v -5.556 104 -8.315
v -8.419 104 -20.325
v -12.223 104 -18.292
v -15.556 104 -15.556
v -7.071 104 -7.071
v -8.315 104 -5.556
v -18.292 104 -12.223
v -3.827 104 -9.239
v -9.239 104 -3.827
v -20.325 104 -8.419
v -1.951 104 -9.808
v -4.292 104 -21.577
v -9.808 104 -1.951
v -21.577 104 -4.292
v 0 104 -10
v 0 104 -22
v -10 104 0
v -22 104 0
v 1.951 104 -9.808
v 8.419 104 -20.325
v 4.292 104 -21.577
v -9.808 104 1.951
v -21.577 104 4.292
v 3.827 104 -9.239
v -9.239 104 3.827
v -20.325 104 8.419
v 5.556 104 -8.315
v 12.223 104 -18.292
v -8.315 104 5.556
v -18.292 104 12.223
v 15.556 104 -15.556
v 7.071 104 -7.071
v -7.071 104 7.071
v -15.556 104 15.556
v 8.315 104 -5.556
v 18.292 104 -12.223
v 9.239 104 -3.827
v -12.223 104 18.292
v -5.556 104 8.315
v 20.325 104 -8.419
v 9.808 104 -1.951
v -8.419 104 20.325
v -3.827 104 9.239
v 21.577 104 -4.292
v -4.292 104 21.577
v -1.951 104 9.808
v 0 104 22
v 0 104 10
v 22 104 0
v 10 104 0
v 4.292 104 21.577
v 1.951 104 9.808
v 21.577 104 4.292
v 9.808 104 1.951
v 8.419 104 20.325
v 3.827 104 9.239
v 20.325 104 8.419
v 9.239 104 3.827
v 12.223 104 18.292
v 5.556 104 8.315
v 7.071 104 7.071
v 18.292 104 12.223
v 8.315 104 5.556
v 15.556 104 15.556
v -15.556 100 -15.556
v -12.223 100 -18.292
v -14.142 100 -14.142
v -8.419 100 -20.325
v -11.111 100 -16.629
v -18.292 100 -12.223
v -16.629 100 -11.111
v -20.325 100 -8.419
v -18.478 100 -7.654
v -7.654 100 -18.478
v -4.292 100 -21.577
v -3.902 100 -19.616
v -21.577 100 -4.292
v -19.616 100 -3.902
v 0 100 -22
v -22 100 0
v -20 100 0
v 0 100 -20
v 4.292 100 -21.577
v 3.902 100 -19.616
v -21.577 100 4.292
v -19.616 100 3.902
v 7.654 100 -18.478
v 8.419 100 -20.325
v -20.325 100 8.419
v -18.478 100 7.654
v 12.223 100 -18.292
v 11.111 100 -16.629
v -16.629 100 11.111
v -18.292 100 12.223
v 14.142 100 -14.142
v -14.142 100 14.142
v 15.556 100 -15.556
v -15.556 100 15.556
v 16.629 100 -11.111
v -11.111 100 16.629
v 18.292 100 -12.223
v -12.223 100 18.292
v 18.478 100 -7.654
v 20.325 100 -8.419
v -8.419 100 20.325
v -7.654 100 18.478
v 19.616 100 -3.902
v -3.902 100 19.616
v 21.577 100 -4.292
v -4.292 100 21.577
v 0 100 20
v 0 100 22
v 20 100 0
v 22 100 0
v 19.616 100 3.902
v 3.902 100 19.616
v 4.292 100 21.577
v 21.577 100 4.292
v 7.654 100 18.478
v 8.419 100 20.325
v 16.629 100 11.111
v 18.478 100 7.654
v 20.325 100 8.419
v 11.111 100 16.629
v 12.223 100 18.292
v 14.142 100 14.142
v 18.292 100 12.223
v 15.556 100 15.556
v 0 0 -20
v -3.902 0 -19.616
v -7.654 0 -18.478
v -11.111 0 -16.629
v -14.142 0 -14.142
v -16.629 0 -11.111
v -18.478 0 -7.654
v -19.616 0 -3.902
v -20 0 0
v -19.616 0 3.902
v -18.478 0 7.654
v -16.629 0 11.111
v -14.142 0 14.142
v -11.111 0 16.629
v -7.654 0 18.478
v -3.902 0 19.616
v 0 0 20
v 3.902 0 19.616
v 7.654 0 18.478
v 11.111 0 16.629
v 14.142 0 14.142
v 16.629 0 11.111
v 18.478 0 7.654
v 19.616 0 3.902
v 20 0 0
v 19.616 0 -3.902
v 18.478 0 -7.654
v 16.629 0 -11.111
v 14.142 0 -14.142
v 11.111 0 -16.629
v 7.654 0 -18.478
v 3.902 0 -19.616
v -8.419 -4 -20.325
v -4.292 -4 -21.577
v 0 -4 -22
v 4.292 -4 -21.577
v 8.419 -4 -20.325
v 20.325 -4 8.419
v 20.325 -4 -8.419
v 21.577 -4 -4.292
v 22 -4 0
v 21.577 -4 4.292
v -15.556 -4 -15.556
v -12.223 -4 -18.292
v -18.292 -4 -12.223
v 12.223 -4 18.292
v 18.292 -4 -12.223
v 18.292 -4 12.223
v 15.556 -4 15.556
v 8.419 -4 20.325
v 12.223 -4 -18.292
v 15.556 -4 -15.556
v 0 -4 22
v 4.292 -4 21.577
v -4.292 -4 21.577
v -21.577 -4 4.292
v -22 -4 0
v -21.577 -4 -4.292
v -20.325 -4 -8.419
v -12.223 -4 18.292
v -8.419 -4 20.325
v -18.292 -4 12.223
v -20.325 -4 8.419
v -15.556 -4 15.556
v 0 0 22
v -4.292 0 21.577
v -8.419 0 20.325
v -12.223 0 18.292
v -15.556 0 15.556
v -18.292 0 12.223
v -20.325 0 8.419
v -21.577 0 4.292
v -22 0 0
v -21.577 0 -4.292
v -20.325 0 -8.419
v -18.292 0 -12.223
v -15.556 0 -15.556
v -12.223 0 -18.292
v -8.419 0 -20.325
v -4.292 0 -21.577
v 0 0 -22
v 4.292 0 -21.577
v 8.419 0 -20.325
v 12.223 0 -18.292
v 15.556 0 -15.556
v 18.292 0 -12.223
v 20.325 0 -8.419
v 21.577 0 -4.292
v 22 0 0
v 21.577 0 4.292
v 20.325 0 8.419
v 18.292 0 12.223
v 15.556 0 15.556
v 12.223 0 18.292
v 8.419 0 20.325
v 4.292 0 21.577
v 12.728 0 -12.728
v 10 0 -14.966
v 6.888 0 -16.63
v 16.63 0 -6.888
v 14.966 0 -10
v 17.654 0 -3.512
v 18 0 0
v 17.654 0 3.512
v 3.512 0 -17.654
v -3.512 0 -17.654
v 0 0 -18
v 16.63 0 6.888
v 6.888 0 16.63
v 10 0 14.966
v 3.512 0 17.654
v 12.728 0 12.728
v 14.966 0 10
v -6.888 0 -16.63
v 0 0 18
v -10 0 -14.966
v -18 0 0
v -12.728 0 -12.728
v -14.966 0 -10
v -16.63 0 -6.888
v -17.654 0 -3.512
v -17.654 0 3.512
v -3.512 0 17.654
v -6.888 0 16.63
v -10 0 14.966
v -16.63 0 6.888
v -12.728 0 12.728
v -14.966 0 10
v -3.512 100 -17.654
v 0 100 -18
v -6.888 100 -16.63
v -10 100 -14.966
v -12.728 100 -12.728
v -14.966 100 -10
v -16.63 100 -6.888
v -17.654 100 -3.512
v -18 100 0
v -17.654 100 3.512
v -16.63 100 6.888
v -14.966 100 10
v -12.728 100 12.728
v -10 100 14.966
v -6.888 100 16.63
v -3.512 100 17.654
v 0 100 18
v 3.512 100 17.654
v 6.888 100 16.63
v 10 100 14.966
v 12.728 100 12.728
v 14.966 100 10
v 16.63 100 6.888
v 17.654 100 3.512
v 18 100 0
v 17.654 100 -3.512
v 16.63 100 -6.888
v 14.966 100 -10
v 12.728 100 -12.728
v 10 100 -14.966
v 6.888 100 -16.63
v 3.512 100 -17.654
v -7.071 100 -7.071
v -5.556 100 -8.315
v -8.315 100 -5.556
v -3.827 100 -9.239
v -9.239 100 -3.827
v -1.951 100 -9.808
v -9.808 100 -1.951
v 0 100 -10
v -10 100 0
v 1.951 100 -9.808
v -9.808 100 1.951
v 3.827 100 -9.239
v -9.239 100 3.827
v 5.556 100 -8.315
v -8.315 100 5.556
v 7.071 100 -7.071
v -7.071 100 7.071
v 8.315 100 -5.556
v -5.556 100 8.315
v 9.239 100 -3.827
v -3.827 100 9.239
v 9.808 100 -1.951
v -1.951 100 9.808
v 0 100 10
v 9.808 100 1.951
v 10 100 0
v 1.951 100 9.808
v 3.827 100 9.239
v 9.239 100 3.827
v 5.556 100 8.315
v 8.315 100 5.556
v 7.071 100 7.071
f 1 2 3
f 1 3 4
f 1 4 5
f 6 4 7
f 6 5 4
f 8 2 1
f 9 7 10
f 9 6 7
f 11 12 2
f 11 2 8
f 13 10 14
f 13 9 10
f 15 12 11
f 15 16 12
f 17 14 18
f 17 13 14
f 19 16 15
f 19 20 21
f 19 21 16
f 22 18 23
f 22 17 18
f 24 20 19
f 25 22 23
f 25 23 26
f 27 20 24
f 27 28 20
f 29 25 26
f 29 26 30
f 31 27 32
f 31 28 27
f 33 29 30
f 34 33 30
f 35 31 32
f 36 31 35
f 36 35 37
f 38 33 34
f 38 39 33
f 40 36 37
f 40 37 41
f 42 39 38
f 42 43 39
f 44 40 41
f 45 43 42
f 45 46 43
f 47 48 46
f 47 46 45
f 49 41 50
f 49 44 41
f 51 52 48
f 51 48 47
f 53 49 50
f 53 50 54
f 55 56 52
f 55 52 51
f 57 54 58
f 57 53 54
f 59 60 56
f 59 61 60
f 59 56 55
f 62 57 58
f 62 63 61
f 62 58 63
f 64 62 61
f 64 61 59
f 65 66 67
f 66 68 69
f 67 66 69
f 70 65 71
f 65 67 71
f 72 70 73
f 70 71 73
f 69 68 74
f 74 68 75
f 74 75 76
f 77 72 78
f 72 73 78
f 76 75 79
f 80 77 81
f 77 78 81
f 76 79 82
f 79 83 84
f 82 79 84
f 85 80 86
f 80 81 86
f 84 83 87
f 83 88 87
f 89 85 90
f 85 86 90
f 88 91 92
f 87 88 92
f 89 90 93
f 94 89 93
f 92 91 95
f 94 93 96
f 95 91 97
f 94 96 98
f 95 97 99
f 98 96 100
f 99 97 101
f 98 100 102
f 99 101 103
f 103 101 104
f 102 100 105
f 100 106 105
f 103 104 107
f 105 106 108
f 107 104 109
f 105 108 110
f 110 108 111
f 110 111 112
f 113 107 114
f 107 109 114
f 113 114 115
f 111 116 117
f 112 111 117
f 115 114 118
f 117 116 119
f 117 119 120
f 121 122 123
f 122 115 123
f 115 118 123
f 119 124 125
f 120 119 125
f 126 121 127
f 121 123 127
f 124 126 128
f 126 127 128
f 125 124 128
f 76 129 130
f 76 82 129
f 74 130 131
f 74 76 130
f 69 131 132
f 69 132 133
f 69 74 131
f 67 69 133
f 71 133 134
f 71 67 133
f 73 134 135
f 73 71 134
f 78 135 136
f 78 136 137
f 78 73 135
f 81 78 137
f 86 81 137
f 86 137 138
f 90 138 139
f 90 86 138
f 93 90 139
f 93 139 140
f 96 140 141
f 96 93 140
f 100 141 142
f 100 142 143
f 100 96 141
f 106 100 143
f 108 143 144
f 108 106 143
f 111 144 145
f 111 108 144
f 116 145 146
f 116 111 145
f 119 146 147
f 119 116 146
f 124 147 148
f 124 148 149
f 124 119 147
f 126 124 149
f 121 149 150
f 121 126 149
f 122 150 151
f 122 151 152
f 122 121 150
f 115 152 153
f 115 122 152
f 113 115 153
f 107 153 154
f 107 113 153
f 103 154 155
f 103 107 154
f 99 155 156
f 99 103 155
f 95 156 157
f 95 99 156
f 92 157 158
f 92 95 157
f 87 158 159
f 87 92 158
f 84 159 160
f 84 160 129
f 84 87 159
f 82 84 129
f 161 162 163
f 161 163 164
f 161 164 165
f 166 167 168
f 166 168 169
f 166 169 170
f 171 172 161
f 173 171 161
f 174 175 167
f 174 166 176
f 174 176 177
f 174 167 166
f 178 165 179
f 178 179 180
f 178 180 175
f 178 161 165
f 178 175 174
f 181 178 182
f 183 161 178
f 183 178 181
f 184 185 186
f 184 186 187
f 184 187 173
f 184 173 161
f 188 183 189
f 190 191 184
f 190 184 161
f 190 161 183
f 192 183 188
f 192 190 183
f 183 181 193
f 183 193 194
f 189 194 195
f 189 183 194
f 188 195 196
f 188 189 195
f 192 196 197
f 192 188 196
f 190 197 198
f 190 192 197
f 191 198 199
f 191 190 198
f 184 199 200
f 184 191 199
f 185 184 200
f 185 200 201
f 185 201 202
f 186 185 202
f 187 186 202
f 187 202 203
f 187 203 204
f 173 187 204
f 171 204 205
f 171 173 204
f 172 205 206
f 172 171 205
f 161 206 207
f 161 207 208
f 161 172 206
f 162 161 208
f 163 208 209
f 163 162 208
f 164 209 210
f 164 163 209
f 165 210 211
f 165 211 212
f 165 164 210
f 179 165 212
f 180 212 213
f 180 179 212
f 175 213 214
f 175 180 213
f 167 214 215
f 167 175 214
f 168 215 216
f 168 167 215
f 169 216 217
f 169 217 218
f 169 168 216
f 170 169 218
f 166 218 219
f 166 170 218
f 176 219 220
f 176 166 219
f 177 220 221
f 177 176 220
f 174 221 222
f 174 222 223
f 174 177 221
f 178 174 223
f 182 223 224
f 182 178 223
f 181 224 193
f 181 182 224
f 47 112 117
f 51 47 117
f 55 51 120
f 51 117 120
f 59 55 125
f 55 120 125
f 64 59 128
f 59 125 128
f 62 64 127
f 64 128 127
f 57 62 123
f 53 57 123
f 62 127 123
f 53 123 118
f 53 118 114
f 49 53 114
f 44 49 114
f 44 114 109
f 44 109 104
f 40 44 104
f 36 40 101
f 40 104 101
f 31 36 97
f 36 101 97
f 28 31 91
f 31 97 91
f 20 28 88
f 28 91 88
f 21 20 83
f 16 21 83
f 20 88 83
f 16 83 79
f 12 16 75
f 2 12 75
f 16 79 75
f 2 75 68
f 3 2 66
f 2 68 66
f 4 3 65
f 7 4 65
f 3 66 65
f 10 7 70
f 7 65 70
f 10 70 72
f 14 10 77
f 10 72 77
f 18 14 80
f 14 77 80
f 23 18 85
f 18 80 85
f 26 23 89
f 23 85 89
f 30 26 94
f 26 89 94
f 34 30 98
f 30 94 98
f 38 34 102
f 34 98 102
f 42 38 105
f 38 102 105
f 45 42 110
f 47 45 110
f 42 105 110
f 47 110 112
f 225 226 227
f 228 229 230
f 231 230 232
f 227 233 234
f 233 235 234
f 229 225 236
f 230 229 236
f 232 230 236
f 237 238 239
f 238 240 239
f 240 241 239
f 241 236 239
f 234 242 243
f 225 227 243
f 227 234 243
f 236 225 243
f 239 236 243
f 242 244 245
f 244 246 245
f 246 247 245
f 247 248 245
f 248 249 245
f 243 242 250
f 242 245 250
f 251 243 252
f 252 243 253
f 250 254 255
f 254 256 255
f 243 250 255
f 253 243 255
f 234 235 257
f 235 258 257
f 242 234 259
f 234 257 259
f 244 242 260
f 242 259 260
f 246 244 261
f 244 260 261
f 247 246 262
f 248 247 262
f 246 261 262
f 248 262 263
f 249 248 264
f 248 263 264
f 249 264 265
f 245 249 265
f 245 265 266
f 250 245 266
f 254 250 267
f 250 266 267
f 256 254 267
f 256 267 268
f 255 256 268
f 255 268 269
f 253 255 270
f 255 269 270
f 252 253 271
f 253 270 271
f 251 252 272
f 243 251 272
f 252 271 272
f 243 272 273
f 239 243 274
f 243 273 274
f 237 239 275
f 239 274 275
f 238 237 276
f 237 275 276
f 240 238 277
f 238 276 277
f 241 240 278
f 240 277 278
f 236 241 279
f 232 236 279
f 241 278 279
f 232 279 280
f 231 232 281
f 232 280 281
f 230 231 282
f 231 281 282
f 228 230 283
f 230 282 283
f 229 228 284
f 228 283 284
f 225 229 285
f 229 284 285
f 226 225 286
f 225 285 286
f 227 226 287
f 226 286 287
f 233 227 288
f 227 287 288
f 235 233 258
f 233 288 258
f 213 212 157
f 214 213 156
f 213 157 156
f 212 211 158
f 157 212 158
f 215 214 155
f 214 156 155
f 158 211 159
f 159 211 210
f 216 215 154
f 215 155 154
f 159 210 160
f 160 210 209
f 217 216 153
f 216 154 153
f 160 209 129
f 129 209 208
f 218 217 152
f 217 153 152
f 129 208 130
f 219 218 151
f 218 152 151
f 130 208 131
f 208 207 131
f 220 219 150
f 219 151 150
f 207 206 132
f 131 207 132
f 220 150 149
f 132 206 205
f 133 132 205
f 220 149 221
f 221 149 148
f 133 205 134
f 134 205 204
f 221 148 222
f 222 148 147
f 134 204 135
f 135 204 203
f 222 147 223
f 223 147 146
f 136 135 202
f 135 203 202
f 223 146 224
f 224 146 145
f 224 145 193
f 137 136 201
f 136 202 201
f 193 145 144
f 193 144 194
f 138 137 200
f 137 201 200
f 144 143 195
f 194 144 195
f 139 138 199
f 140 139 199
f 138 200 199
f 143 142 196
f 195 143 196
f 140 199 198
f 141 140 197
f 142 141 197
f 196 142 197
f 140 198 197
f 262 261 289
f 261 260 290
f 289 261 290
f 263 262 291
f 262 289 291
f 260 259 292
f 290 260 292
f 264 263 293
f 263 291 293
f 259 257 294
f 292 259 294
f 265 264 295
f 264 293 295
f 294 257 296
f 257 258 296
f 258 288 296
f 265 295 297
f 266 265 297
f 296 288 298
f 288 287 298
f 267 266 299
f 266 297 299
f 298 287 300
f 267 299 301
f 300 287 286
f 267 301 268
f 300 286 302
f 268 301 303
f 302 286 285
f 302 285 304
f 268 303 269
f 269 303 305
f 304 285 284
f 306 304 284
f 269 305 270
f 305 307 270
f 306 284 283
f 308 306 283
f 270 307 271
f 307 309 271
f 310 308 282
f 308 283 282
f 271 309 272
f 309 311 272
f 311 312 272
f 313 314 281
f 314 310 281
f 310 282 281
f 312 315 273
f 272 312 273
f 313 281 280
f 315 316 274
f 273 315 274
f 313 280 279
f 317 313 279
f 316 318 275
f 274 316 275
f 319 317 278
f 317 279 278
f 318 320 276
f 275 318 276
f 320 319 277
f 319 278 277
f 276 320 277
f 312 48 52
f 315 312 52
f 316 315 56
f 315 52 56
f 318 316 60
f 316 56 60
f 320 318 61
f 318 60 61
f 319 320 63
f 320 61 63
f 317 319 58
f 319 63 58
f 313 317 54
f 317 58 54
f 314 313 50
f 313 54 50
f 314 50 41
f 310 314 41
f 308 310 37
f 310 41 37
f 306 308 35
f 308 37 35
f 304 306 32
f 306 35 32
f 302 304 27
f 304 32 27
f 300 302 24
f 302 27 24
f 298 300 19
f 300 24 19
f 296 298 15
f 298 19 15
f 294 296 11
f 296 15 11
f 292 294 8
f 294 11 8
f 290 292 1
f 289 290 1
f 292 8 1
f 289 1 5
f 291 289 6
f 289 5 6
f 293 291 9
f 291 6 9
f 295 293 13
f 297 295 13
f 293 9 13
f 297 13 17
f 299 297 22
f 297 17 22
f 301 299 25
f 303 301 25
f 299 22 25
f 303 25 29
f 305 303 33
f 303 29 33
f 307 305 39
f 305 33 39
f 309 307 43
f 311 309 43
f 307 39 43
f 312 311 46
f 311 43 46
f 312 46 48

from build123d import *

# Parameters (mm, degrees)
SKETCH1_W           = 2
SKETCH1_H           = 100
SKETCH2_R           = 22
BOSS_EXTRUDE1_DEPTH = 4
BOSS_EXTRUDE2_START = 4
SKETCH3_R           = 22
BOSS_EXTRUDE2_DEPTH = 4
SKETCH4_R           = 10
CUT_EXTRUDE1_DEPTH  = 4


with BuildPart() as part:
    # Sketch1 → Revolve1 (revolve)
    with BuildSketch(Plane.XY, mode=Mode.PRIVATE) as revolve1_sk:
        with Locations((19, 50)):
            Rectangle(SKETCH1_W, SKETCH1_H)
    revolve(revolve1_sk.sketch.rotate(Axis((0, 0, 0), (0, 1, 0)), 90), axis=Axis((0, 0, 0), (0, 1, 0)))

    # Sketch2 → Boss-Extrude1 (add)
    with BuildSketch(Plane(origin=(0, 100, 0), x_dir=(1, 0, 0), z_dir=(0, 1, 0))):
        with Locations(Location((0, 0, 0), (0, 0, 270))):
            Circle(SKETCH2_R)
    extrude(amount=BOSS_EXTRUDE1_DEPTH)

    # Sketch3 → Boss-Extrude2 (add)
    with BuildSketch(Plane.XZ.offset(BOSS_EXTRUDE2_START)):
        with Locations(Location((0, 0, 0), (0, 0, 90))):
            Circle(SKETCH3_R)
    extrude(amount=-BOSS_EXTRUDE2_DEPTH)

    # Sketch4 → Cut-Extrude1 (cut)
    with BuildSketch(Plane(origin=(0, 104, 0), x_dir=(1, 0, 0), z_dir=(0, 1, 0))):
        with Locations(Location((0, 0, 0), (0, 0, 270))):
            Circle(SKETCH4_R)
    extrude(amount=-CUT_EXTRUDE1_DEPTH, mode=Mode.SUBTRACT)


solid = part.part
